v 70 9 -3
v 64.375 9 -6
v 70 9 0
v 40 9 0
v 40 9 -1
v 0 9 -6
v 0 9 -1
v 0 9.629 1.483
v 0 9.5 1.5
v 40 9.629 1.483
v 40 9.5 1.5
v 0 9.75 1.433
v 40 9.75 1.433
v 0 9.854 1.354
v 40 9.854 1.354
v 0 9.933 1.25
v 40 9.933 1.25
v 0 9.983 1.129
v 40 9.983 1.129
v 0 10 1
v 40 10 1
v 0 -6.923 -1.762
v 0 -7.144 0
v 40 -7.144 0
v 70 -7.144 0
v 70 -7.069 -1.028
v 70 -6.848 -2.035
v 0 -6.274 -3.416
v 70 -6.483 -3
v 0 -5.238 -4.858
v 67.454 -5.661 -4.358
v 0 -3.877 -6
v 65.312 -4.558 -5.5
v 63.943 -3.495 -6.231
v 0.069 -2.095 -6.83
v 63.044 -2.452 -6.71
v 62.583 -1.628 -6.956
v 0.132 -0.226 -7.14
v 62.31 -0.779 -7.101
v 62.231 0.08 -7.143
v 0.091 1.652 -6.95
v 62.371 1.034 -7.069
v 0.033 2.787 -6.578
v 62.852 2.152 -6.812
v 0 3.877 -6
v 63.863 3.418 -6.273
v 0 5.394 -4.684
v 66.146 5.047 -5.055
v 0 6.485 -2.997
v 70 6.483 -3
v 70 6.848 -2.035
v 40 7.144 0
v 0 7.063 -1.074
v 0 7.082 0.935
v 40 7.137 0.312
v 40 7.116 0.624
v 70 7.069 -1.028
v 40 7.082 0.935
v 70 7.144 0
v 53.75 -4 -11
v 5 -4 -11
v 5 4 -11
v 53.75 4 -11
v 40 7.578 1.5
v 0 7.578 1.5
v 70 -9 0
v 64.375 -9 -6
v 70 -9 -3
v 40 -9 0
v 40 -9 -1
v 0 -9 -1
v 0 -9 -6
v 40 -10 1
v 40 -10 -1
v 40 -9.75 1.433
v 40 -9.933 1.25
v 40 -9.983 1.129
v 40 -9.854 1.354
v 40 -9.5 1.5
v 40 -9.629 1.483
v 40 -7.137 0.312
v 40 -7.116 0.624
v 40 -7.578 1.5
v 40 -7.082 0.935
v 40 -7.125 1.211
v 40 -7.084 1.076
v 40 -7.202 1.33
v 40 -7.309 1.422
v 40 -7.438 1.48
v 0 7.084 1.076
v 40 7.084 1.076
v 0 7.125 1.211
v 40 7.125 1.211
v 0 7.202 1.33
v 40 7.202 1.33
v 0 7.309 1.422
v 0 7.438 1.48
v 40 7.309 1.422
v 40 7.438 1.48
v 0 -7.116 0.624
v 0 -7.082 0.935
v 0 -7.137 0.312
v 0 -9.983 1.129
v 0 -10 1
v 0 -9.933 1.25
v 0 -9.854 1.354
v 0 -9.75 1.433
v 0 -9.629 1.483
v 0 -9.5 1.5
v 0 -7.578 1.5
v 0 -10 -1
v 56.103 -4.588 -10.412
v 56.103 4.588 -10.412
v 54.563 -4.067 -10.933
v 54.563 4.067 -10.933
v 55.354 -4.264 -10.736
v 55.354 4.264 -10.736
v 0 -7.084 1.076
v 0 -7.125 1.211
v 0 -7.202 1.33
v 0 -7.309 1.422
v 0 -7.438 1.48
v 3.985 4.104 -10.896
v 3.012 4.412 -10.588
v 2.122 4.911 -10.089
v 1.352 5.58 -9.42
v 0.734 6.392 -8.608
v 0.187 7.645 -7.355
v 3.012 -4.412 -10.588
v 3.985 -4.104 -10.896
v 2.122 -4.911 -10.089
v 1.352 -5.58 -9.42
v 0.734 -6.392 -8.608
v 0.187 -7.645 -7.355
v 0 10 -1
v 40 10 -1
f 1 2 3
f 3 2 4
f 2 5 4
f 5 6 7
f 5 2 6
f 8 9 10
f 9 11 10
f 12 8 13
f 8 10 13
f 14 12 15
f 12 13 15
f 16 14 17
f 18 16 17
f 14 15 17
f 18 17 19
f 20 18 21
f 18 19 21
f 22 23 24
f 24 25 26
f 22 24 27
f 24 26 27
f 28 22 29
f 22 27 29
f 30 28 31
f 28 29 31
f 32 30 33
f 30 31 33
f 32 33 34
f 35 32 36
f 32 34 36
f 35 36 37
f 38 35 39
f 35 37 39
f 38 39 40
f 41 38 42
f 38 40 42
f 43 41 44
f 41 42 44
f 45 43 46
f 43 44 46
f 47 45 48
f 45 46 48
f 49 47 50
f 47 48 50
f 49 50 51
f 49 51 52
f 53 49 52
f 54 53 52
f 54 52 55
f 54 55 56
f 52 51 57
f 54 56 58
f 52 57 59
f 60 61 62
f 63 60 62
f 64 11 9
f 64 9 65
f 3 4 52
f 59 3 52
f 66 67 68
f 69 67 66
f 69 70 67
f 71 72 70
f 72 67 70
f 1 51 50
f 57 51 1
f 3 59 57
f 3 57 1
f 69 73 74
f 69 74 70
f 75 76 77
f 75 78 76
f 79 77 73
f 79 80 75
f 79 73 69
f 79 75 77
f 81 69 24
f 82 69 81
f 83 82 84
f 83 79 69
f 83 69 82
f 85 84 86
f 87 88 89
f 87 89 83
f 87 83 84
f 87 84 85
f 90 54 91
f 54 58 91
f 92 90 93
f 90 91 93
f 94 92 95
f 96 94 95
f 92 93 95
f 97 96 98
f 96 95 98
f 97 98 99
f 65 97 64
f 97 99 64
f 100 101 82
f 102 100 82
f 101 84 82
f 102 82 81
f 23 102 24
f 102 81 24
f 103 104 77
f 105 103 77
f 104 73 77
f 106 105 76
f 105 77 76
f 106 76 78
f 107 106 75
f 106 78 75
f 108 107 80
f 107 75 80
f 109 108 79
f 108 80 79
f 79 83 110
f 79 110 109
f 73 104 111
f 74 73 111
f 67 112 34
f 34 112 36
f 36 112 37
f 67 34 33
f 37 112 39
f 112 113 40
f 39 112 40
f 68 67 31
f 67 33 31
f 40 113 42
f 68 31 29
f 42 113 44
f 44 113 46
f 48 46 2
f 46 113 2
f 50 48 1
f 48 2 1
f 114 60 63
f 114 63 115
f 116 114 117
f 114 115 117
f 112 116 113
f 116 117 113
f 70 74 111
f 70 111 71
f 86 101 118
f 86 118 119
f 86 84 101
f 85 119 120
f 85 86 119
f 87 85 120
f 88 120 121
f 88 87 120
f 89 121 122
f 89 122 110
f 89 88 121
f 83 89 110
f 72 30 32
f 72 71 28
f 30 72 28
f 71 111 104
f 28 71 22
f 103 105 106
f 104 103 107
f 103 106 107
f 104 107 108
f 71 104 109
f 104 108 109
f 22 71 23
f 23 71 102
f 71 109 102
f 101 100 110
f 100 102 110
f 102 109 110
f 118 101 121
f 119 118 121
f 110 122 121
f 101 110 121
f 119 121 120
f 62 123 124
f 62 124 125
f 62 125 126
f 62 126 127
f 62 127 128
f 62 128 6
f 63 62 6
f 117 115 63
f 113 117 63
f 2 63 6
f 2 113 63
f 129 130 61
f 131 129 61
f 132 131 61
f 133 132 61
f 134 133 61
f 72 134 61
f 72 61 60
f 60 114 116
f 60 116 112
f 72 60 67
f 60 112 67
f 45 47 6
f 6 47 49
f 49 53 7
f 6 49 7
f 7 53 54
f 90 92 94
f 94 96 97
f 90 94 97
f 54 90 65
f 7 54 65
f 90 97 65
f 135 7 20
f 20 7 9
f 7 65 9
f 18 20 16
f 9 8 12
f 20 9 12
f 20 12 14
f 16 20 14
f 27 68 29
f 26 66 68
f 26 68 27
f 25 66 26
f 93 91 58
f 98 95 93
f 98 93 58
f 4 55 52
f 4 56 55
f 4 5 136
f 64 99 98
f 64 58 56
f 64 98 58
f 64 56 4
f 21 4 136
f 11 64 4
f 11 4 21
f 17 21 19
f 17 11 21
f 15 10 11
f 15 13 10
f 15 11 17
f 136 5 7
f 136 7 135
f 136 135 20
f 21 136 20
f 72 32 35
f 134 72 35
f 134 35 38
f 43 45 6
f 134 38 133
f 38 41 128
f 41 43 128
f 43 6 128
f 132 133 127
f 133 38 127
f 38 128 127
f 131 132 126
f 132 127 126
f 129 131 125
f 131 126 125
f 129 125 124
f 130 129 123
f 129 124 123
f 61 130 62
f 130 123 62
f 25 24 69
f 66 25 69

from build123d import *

# Parameters (mm, degrees)
F0_W        = 9
F0_H        = 11
F2_DEPTH    = 70
F1_W        = 10
F1_H        = 1
F1_H_2      = 1.5
F3_DEPTH    = 40
F4_D        = 14.2875
F5_T1_DEPTH = 95.6598919876
F6_SIZE     = 5
F7_T1_DEPTH = 14.25
F7_T3_DEPTH = 33
F8_R        = 0.5


# Not quite as in the source:
# - a fillet or chamfer that OpenCascade refuses, or shapes differently, is made with other operations: its cross-section is extruded or revolved along the edge and cut away or added
# - a length typed as a fraction of an inch, garbled in the dataset ("3 / 203.2 mm" for 3/8 in), is restored


with BuildPart() as f2:
    # F0 (on Right) → F2 (new body)
    with BuildSketch(Plane.YZ):
        with Locations((-4.5, -5.5)):
            Rectangle(F0_W, F0_H)
        with Locations((4.5, -5.5)):
            Rectangle(F0_W, F0_H)
    extrude(amount=F2_DEPTH)

    # F1 (on Right) → F3 (join)
    with BuildSketch(Plane.YZ):
        with Locations((-5, -0.5)):
            Rectangle(F1_W, F1_H)
        with Locations((5, -0.5)):
            Rectangle(F1_W, F1_H)
        with Locations((5, 0.75)):
            Rectangle(F1_W, F1_H_2)
        with Locations((-5, 0.75)):
            Rectangle(F1_W, F1_H_2)
    extrude(amount=F3_DEPTH)

    # F4 (through all)
    with Locations(Plane(origin=(0, 0, 0), x_dir=(0, 1, 0), z_dir=(-1, 0, 0))):
        with Locations((0, 0)):
            Hole(F4_D / 2)

    # F5: chamfer of 15 x 8 on 1 edges, made by hand

    # F5_s2 → F5_t1 (cut)
    with BuildSketch(Plane.XZ.offset(-47.8299459938)):
        Polygon((55, -11), (70, -3), (70, -11), align=None)
    extrude(amount=F5_T1_DEPTH, mode=Mode.SUBTRACT)

    # F6
    f6_edges = [f2.edges().sort_by_distance(p)[0] for p in [
        (27.5, 9, -11),
        (27.5, -9, -11),
    ]]
    chamfer(f6_edges, length=F6_SIZE)

    # F7: fillet of radius 5 on 2 edges, made by hand

    # F7_s2 → F7_t1 (cut)
    with BuildSketch(Plane.XZ.offset(-7.125)):
        with BuildLine():
            ThreePointArc((53.75, -11), (54.9626781252, -10.8507125007), (56.1029411765, -10.4117647059))
            Line((56.1029411765, -10.4117647059), (55, -11))
            Line((55, -11), (53.75, -11))
        make_face()
    extrude(amount=F7_T1_DEPTH, mode=Mode.SUBTRACT)

    # F7_s4 → F7_t3 (cut)
    with BuildSketch(Plane.XZ.offset(-16.5)):
        with BuildLine():
            ThreePointArc((0, -6), (1.4644660941, -9.5355339059), (5, -11))
            Line((5, -11), (0, -11))
            Line((0, -11), (0, -6))
        make_face()
    extrude(amount=F7_T3_DEPTH, mode=Mode.SUBTRACT)

    # F8
    f8_edges = [f2.edges().sort_by_distance(p)[0] for p in [
        (20, -10, 1.5),
        (20, 10, 1.5),
        (20, -6.984495, 1.5),
        (20, 6.984495, 1.5),
    ]]
    fillet(f8_edges, radius=F8_R)


solid = f2.part
